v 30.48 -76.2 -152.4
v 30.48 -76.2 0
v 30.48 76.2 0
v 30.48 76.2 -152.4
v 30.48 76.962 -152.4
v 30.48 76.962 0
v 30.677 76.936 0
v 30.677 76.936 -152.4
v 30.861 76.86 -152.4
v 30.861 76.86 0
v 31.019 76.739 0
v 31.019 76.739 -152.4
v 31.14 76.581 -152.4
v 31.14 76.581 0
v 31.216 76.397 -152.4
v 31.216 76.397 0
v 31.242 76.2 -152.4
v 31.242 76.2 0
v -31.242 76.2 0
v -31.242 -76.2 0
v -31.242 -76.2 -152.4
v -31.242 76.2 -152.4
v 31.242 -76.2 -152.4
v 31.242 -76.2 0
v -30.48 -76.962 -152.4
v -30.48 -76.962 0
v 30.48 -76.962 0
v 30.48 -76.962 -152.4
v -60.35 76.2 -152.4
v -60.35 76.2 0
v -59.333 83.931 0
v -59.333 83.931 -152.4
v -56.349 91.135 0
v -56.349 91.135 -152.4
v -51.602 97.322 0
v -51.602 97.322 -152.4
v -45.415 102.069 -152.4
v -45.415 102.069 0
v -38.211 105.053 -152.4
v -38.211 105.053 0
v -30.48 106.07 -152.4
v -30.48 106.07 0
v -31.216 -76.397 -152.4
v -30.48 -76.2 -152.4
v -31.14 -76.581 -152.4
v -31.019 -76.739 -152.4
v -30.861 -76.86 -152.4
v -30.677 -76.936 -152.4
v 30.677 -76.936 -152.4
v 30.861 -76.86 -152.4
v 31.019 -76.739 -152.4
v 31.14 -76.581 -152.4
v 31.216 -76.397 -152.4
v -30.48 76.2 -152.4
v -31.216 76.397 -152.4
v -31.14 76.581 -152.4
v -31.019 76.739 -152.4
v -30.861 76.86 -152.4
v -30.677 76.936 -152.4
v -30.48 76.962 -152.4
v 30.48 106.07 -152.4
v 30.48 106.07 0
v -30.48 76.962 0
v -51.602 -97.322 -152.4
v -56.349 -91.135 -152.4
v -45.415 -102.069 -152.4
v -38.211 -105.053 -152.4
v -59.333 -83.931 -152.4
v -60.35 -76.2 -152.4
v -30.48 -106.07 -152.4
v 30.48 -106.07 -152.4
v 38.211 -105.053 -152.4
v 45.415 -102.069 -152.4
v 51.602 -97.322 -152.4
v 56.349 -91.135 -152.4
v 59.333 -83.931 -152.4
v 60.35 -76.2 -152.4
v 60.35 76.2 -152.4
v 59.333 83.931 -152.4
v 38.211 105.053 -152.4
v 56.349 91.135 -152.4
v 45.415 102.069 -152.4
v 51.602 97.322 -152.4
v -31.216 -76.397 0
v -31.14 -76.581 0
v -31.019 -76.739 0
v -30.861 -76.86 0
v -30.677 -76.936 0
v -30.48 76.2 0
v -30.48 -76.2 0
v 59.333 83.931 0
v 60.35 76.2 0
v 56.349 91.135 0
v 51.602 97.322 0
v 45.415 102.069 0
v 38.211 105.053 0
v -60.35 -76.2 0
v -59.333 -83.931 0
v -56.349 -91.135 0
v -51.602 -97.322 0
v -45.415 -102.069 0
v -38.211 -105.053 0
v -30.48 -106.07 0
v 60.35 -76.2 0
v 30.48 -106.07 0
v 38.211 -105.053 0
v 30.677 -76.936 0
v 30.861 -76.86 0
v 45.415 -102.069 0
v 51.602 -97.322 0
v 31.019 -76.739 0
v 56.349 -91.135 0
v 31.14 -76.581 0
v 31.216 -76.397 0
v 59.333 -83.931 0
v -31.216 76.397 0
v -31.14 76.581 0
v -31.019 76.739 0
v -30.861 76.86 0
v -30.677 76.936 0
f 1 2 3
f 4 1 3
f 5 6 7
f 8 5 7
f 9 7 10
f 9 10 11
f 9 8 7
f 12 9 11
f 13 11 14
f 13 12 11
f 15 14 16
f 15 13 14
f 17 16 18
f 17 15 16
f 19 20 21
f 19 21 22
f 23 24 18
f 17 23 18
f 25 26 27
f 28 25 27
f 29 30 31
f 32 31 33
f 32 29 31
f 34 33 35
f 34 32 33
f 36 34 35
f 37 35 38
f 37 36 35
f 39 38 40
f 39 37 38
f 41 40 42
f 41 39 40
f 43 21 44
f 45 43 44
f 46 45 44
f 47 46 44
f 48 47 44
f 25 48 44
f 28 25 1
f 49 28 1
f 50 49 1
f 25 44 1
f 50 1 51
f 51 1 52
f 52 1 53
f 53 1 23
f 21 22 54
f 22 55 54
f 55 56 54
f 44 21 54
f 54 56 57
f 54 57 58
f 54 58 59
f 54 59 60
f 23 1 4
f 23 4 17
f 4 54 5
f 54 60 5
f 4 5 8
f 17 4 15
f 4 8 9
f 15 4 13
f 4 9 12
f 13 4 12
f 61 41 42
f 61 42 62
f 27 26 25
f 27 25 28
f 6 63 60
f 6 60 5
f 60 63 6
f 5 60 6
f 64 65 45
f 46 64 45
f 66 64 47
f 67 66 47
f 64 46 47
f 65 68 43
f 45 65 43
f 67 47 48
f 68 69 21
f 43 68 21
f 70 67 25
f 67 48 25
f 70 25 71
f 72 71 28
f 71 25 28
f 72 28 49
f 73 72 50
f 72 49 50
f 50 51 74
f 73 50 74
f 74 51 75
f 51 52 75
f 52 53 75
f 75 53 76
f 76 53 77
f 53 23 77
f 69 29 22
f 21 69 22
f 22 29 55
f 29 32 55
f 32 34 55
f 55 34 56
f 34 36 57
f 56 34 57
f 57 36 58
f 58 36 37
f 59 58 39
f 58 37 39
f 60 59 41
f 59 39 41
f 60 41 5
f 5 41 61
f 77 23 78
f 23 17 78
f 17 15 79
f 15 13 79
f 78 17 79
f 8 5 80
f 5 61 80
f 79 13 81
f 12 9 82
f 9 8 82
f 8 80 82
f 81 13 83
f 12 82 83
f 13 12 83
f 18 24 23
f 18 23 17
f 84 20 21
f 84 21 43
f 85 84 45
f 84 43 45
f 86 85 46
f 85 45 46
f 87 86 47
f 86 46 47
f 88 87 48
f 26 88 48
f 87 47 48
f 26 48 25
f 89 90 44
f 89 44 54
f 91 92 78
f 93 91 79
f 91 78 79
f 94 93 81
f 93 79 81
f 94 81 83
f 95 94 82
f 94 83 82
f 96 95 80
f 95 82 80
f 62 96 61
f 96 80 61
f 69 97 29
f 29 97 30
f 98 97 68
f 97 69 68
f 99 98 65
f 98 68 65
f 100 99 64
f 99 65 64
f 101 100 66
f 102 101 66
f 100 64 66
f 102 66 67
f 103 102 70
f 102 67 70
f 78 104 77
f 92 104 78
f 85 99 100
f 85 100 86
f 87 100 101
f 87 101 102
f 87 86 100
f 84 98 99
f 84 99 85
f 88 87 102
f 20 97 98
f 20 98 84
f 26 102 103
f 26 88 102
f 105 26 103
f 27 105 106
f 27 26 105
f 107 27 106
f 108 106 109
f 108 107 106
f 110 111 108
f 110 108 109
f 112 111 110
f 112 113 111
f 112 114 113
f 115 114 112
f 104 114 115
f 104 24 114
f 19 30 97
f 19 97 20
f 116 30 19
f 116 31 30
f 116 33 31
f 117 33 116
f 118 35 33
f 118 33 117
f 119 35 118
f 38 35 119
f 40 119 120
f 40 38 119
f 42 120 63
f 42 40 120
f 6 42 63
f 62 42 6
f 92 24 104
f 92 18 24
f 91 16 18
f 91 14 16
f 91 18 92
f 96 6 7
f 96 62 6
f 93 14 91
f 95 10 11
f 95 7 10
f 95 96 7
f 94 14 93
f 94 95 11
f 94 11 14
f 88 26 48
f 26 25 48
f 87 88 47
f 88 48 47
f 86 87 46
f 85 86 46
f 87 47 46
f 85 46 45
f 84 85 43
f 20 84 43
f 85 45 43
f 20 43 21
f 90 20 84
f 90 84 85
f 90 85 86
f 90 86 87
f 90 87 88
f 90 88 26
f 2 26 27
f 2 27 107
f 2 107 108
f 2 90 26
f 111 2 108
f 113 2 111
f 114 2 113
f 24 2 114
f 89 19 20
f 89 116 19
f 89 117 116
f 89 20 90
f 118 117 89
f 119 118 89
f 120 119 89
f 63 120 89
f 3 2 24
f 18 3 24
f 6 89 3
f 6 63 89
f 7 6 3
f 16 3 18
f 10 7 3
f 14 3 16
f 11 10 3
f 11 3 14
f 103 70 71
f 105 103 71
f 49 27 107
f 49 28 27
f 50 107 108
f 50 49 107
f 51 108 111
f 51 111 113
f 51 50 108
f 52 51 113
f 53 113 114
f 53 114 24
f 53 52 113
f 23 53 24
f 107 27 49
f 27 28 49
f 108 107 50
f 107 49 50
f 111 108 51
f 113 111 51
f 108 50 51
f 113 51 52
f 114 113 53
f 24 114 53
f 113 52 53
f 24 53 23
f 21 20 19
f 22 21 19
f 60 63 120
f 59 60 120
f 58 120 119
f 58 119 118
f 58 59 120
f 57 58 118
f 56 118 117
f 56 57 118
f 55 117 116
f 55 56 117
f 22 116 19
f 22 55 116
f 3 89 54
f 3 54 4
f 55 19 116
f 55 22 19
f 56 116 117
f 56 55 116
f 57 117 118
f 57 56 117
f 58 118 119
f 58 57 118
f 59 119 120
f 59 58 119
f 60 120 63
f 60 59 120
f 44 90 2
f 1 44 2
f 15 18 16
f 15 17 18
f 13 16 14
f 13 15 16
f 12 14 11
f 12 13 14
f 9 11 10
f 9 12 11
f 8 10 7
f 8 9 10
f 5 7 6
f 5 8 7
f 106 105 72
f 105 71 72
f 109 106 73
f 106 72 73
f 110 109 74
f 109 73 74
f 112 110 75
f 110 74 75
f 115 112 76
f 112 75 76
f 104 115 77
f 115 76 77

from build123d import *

# Parameters (mm, degrees)
F4_W      = 120.7008
F4_H      = 212.1408
F5_DEPTH  = 152.4
F6_R      = 29.8704
F7_W      = 62.484
F7_H      = 153.924
F8_DEPTH  = 152.4
F9_W      = 62.484
F9_H      = 153.924
F10_DEPTH = 152.4
F11_W     = 60.96
F11_H     = 152.4
F12_DEPTH = 152.4
F13_R     = 0.762
F14_R     = 0.762


with BuildPart() as f5:
    # F4 (on Top) → F5 (new body)
    with BuildSketch(Plane.XY):
        Rectangle(F4_W, F4_H)
    extrude(amount=-F5_DEPTH)

    # F6
    f6_edges = [f5.edges().sort_by_distance(p)[0] for p in [
        (-60.3504, 106.0704, -76.2),
        (60.3504, 106.0704, -76.2),
        (60.3504, -106.0704, -76.2),
        (-60.3504, -106.0704, -76.2),
    ]]
    fillet(f6_edges, radius=F6_R)

    # F7 (on face) → F8 (cut)
    with BuildSketch(Plane.XY):
        Rectangle(F7_W, F7_H)
    extrude(amount=-F8_DEPTH, mode=Mode.SUBTRACT)

    # F14
    f14_edges = [f5.edges().sort_by_distance(p)[0] for p in [
        (-31.242, 76.962, -76.2),
        (-31.242, -76.962, -76.2),
        (31.242, -76.962, -76.2),
        (31.242, 76.962, -76.2),
    ]]
    fillet(f14_edges, radius=F14_R)


with BuildPart() as f10:
    # F9 (on face) → F10 (new body)
    with BuildSketch(Plane.XY):
        Rectangle(F9_W, F9_H)
    extrude(amount=-F10_DEPTH)

    # F11 (on face) → F12 (cut)
    with BuildSketch(Plane.XY):
        Rectangle(F11_W, F11_H)
    extrude(amount=-F12_DEPTH, mode=Mode.SUBTRACT)

    # F13
    f13_edges = [f10.edges().sort_by_distance(p)[0] for p in [
        (-31.242, 76.962, -76.2),
        (31.242, 76.962, -76.2),
        (31.242, -76.962, -76.2),
        (-31.242, -76.962, -76.2),
    ]]
    fillet(f13_edges, radius=F13_R)


solid = Compound([f5.part, f10.part])
